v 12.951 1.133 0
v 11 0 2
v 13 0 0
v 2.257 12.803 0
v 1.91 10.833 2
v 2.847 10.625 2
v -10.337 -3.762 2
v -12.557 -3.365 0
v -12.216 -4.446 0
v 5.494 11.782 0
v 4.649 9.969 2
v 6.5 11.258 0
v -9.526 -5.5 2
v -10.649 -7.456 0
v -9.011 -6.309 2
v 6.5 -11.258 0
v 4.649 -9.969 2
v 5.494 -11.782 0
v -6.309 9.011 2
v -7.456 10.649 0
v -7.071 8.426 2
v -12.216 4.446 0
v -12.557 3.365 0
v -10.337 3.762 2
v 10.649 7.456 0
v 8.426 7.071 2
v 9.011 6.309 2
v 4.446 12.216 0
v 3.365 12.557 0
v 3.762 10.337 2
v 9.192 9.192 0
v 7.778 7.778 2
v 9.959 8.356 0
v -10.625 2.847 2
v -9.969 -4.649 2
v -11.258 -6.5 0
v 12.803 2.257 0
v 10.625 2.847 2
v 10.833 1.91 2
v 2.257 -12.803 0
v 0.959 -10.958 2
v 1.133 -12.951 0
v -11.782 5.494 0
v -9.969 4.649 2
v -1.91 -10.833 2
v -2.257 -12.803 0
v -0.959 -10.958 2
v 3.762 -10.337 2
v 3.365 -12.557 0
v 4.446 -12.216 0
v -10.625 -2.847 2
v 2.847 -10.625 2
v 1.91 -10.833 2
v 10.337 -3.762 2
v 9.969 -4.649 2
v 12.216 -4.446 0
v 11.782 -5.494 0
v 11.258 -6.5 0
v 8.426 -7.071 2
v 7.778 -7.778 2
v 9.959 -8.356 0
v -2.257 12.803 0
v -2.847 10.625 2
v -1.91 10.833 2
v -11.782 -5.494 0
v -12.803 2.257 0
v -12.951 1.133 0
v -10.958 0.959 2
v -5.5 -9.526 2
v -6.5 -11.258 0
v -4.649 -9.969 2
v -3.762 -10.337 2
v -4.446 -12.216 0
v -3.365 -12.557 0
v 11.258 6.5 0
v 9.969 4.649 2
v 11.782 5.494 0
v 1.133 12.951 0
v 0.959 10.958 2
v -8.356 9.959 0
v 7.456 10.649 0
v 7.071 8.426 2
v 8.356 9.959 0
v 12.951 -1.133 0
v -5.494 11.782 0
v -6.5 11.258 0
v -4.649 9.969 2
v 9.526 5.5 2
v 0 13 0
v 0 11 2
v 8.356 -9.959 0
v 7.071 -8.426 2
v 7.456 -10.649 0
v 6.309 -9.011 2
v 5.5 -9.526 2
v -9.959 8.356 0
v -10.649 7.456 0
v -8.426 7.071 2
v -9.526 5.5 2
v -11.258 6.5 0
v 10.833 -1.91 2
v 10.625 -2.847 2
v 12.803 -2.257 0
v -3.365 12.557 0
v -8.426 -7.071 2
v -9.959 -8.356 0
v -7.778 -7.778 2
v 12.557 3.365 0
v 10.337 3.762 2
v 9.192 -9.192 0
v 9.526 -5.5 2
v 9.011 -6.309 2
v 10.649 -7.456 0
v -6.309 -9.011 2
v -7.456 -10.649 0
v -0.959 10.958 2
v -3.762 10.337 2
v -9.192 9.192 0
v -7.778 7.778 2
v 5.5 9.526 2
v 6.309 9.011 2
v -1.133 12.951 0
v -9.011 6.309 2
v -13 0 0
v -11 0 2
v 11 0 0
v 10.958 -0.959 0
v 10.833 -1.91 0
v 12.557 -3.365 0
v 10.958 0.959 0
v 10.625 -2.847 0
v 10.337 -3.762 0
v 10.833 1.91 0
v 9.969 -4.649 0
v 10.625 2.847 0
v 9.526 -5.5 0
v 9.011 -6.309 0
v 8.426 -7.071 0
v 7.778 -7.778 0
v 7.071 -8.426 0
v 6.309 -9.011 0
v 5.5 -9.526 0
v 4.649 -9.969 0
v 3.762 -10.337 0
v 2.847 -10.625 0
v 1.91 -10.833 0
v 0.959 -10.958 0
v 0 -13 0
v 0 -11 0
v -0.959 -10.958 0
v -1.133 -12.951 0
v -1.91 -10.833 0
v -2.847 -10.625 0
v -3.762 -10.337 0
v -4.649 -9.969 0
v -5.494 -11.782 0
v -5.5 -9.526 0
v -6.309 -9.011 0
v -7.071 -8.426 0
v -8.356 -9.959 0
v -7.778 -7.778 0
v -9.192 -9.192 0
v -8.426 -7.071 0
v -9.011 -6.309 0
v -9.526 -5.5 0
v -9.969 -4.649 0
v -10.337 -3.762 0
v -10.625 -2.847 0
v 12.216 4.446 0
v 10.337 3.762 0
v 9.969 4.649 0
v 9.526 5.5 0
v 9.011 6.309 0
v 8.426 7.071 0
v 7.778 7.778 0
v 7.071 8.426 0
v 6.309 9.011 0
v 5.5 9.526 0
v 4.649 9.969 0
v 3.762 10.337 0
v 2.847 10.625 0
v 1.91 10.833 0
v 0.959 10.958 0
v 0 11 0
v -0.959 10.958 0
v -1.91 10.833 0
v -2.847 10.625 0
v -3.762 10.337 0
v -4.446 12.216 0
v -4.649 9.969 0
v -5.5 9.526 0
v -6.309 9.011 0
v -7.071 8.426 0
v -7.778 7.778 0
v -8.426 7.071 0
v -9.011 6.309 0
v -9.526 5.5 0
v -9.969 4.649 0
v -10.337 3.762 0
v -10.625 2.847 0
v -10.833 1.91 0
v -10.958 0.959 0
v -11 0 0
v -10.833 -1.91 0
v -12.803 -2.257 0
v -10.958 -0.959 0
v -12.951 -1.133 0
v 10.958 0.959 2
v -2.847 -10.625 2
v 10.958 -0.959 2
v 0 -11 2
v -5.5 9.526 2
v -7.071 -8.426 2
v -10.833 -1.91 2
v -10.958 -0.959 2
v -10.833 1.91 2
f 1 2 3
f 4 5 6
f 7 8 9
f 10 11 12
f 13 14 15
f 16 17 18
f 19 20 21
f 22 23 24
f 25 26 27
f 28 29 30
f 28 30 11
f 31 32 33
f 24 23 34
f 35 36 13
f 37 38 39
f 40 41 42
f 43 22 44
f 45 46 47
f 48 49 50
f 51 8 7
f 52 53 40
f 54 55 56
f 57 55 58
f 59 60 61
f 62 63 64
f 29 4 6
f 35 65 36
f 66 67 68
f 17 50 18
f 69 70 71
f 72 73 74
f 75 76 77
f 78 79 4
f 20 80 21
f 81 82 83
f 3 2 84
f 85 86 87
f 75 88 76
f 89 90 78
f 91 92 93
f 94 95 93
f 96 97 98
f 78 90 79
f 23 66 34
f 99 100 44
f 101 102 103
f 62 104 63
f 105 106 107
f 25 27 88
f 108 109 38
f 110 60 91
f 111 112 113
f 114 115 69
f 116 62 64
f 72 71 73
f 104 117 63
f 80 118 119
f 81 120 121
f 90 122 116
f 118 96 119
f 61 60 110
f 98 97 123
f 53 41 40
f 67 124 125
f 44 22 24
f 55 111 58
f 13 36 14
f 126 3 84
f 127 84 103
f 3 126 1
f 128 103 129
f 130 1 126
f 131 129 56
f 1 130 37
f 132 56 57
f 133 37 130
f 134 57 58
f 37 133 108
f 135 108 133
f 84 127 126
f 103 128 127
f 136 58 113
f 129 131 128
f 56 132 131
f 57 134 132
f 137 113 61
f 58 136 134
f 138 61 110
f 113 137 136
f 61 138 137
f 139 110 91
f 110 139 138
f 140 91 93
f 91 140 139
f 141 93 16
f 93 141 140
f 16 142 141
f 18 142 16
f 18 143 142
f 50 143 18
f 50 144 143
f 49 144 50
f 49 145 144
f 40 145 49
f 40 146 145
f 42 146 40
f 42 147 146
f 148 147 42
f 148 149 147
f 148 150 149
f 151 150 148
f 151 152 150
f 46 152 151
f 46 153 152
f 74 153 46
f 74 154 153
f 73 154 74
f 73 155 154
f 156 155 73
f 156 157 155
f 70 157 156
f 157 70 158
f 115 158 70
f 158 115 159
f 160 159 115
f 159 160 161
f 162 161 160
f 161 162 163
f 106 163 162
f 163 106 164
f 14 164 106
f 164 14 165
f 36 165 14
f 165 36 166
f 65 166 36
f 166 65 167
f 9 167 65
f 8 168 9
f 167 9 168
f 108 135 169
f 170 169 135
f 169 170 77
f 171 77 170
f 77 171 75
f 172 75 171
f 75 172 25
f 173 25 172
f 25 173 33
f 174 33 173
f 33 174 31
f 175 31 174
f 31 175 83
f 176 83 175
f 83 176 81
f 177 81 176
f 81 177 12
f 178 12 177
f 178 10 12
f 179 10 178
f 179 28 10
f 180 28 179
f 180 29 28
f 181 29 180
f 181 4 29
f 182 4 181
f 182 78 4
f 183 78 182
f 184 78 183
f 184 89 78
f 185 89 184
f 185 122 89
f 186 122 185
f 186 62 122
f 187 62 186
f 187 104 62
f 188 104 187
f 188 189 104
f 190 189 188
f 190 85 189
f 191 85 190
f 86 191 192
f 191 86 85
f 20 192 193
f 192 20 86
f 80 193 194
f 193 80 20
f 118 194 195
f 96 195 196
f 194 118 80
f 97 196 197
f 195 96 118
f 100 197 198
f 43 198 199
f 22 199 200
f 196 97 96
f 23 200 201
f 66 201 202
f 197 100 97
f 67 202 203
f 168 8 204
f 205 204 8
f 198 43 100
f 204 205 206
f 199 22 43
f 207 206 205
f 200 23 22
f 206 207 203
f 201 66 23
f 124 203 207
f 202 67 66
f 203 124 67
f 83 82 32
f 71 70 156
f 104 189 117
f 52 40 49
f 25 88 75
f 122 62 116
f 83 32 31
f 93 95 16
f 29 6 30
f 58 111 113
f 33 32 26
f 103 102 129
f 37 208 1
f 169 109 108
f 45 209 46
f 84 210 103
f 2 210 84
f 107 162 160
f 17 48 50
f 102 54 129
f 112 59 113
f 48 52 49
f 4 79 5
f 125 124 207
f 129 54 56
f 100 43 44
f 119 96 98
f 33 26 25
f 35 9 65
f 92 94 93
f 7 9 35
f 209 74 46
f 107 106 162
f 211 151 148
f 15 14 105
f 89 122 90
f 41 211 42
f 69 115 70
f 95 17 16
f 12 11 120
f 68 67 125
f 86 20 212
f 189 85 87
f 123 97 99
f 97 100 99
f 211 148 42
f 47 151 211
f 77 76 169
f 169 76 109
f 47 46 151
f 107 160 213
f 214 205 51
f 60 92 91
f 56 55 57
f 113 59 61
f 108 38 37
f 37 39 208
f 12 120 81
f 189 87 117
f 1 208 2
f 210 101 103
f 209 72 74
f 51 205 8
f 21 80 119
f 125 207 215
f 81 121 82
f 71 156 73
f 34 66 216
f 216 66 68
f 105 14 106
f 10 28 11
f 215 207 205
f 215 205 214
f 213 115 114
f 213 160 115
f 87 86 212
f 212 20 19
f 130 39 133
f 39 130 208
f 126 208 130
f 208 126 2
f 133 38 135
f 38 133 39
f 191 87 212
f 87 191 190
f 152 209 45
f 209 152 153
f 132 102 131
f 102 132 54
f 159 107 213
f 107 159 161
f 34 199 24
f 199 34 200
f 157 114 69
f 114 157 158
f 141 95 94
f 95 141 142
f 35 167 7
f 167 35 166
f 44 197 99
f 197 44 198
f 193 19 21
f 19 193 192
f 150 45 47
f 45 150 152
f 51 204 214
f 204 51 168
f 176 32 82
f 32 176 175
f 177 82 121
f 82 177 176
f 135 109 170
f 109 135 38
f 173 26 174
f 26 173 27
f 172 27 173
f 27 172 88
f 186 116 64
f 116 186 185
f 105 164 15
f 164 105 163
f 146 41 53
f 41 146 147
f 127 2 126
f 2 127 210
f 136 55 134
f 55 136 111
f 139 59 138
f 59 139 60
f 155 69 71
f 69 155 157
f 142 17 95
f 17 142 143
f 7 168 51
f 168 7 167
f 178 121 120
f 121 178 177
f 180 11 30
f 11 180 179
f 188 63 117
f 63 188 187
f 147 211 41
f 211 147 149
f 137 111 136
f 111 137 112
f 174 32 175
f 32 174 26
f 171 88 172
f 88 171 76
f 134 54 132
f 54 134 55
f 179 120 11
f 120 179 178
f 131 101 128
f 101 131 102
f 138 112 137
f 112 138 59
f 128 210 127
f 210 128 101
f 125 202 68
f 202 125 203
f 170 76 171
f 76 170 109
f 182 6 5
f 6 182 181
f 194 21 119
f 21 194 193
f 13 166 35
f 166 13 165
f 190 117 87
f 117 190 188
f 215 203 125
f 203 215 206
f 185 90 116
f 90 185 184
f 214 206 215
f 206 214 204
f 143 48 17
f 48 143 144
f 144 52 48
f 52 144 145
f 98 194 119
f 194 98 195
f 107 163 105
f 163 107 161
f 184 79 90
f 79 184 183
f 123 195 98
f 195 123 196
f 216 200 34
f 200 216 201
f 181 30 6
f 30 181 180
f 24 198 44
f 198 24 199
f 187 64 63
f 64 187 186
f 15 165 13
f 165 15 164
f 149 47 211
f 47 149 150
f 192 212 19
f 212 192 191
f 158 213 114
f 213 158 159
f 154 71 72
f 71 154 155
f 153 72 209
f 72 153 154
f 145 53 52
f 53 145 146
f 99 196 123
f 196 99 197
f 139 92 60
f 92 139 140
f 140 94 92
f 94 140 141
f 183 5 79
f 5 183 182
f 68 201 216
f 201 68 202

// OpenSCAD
$fn = 72;

difference(){
    cylinder(2, 13, 11);    
    cylinder(2, 11, 11);
}
